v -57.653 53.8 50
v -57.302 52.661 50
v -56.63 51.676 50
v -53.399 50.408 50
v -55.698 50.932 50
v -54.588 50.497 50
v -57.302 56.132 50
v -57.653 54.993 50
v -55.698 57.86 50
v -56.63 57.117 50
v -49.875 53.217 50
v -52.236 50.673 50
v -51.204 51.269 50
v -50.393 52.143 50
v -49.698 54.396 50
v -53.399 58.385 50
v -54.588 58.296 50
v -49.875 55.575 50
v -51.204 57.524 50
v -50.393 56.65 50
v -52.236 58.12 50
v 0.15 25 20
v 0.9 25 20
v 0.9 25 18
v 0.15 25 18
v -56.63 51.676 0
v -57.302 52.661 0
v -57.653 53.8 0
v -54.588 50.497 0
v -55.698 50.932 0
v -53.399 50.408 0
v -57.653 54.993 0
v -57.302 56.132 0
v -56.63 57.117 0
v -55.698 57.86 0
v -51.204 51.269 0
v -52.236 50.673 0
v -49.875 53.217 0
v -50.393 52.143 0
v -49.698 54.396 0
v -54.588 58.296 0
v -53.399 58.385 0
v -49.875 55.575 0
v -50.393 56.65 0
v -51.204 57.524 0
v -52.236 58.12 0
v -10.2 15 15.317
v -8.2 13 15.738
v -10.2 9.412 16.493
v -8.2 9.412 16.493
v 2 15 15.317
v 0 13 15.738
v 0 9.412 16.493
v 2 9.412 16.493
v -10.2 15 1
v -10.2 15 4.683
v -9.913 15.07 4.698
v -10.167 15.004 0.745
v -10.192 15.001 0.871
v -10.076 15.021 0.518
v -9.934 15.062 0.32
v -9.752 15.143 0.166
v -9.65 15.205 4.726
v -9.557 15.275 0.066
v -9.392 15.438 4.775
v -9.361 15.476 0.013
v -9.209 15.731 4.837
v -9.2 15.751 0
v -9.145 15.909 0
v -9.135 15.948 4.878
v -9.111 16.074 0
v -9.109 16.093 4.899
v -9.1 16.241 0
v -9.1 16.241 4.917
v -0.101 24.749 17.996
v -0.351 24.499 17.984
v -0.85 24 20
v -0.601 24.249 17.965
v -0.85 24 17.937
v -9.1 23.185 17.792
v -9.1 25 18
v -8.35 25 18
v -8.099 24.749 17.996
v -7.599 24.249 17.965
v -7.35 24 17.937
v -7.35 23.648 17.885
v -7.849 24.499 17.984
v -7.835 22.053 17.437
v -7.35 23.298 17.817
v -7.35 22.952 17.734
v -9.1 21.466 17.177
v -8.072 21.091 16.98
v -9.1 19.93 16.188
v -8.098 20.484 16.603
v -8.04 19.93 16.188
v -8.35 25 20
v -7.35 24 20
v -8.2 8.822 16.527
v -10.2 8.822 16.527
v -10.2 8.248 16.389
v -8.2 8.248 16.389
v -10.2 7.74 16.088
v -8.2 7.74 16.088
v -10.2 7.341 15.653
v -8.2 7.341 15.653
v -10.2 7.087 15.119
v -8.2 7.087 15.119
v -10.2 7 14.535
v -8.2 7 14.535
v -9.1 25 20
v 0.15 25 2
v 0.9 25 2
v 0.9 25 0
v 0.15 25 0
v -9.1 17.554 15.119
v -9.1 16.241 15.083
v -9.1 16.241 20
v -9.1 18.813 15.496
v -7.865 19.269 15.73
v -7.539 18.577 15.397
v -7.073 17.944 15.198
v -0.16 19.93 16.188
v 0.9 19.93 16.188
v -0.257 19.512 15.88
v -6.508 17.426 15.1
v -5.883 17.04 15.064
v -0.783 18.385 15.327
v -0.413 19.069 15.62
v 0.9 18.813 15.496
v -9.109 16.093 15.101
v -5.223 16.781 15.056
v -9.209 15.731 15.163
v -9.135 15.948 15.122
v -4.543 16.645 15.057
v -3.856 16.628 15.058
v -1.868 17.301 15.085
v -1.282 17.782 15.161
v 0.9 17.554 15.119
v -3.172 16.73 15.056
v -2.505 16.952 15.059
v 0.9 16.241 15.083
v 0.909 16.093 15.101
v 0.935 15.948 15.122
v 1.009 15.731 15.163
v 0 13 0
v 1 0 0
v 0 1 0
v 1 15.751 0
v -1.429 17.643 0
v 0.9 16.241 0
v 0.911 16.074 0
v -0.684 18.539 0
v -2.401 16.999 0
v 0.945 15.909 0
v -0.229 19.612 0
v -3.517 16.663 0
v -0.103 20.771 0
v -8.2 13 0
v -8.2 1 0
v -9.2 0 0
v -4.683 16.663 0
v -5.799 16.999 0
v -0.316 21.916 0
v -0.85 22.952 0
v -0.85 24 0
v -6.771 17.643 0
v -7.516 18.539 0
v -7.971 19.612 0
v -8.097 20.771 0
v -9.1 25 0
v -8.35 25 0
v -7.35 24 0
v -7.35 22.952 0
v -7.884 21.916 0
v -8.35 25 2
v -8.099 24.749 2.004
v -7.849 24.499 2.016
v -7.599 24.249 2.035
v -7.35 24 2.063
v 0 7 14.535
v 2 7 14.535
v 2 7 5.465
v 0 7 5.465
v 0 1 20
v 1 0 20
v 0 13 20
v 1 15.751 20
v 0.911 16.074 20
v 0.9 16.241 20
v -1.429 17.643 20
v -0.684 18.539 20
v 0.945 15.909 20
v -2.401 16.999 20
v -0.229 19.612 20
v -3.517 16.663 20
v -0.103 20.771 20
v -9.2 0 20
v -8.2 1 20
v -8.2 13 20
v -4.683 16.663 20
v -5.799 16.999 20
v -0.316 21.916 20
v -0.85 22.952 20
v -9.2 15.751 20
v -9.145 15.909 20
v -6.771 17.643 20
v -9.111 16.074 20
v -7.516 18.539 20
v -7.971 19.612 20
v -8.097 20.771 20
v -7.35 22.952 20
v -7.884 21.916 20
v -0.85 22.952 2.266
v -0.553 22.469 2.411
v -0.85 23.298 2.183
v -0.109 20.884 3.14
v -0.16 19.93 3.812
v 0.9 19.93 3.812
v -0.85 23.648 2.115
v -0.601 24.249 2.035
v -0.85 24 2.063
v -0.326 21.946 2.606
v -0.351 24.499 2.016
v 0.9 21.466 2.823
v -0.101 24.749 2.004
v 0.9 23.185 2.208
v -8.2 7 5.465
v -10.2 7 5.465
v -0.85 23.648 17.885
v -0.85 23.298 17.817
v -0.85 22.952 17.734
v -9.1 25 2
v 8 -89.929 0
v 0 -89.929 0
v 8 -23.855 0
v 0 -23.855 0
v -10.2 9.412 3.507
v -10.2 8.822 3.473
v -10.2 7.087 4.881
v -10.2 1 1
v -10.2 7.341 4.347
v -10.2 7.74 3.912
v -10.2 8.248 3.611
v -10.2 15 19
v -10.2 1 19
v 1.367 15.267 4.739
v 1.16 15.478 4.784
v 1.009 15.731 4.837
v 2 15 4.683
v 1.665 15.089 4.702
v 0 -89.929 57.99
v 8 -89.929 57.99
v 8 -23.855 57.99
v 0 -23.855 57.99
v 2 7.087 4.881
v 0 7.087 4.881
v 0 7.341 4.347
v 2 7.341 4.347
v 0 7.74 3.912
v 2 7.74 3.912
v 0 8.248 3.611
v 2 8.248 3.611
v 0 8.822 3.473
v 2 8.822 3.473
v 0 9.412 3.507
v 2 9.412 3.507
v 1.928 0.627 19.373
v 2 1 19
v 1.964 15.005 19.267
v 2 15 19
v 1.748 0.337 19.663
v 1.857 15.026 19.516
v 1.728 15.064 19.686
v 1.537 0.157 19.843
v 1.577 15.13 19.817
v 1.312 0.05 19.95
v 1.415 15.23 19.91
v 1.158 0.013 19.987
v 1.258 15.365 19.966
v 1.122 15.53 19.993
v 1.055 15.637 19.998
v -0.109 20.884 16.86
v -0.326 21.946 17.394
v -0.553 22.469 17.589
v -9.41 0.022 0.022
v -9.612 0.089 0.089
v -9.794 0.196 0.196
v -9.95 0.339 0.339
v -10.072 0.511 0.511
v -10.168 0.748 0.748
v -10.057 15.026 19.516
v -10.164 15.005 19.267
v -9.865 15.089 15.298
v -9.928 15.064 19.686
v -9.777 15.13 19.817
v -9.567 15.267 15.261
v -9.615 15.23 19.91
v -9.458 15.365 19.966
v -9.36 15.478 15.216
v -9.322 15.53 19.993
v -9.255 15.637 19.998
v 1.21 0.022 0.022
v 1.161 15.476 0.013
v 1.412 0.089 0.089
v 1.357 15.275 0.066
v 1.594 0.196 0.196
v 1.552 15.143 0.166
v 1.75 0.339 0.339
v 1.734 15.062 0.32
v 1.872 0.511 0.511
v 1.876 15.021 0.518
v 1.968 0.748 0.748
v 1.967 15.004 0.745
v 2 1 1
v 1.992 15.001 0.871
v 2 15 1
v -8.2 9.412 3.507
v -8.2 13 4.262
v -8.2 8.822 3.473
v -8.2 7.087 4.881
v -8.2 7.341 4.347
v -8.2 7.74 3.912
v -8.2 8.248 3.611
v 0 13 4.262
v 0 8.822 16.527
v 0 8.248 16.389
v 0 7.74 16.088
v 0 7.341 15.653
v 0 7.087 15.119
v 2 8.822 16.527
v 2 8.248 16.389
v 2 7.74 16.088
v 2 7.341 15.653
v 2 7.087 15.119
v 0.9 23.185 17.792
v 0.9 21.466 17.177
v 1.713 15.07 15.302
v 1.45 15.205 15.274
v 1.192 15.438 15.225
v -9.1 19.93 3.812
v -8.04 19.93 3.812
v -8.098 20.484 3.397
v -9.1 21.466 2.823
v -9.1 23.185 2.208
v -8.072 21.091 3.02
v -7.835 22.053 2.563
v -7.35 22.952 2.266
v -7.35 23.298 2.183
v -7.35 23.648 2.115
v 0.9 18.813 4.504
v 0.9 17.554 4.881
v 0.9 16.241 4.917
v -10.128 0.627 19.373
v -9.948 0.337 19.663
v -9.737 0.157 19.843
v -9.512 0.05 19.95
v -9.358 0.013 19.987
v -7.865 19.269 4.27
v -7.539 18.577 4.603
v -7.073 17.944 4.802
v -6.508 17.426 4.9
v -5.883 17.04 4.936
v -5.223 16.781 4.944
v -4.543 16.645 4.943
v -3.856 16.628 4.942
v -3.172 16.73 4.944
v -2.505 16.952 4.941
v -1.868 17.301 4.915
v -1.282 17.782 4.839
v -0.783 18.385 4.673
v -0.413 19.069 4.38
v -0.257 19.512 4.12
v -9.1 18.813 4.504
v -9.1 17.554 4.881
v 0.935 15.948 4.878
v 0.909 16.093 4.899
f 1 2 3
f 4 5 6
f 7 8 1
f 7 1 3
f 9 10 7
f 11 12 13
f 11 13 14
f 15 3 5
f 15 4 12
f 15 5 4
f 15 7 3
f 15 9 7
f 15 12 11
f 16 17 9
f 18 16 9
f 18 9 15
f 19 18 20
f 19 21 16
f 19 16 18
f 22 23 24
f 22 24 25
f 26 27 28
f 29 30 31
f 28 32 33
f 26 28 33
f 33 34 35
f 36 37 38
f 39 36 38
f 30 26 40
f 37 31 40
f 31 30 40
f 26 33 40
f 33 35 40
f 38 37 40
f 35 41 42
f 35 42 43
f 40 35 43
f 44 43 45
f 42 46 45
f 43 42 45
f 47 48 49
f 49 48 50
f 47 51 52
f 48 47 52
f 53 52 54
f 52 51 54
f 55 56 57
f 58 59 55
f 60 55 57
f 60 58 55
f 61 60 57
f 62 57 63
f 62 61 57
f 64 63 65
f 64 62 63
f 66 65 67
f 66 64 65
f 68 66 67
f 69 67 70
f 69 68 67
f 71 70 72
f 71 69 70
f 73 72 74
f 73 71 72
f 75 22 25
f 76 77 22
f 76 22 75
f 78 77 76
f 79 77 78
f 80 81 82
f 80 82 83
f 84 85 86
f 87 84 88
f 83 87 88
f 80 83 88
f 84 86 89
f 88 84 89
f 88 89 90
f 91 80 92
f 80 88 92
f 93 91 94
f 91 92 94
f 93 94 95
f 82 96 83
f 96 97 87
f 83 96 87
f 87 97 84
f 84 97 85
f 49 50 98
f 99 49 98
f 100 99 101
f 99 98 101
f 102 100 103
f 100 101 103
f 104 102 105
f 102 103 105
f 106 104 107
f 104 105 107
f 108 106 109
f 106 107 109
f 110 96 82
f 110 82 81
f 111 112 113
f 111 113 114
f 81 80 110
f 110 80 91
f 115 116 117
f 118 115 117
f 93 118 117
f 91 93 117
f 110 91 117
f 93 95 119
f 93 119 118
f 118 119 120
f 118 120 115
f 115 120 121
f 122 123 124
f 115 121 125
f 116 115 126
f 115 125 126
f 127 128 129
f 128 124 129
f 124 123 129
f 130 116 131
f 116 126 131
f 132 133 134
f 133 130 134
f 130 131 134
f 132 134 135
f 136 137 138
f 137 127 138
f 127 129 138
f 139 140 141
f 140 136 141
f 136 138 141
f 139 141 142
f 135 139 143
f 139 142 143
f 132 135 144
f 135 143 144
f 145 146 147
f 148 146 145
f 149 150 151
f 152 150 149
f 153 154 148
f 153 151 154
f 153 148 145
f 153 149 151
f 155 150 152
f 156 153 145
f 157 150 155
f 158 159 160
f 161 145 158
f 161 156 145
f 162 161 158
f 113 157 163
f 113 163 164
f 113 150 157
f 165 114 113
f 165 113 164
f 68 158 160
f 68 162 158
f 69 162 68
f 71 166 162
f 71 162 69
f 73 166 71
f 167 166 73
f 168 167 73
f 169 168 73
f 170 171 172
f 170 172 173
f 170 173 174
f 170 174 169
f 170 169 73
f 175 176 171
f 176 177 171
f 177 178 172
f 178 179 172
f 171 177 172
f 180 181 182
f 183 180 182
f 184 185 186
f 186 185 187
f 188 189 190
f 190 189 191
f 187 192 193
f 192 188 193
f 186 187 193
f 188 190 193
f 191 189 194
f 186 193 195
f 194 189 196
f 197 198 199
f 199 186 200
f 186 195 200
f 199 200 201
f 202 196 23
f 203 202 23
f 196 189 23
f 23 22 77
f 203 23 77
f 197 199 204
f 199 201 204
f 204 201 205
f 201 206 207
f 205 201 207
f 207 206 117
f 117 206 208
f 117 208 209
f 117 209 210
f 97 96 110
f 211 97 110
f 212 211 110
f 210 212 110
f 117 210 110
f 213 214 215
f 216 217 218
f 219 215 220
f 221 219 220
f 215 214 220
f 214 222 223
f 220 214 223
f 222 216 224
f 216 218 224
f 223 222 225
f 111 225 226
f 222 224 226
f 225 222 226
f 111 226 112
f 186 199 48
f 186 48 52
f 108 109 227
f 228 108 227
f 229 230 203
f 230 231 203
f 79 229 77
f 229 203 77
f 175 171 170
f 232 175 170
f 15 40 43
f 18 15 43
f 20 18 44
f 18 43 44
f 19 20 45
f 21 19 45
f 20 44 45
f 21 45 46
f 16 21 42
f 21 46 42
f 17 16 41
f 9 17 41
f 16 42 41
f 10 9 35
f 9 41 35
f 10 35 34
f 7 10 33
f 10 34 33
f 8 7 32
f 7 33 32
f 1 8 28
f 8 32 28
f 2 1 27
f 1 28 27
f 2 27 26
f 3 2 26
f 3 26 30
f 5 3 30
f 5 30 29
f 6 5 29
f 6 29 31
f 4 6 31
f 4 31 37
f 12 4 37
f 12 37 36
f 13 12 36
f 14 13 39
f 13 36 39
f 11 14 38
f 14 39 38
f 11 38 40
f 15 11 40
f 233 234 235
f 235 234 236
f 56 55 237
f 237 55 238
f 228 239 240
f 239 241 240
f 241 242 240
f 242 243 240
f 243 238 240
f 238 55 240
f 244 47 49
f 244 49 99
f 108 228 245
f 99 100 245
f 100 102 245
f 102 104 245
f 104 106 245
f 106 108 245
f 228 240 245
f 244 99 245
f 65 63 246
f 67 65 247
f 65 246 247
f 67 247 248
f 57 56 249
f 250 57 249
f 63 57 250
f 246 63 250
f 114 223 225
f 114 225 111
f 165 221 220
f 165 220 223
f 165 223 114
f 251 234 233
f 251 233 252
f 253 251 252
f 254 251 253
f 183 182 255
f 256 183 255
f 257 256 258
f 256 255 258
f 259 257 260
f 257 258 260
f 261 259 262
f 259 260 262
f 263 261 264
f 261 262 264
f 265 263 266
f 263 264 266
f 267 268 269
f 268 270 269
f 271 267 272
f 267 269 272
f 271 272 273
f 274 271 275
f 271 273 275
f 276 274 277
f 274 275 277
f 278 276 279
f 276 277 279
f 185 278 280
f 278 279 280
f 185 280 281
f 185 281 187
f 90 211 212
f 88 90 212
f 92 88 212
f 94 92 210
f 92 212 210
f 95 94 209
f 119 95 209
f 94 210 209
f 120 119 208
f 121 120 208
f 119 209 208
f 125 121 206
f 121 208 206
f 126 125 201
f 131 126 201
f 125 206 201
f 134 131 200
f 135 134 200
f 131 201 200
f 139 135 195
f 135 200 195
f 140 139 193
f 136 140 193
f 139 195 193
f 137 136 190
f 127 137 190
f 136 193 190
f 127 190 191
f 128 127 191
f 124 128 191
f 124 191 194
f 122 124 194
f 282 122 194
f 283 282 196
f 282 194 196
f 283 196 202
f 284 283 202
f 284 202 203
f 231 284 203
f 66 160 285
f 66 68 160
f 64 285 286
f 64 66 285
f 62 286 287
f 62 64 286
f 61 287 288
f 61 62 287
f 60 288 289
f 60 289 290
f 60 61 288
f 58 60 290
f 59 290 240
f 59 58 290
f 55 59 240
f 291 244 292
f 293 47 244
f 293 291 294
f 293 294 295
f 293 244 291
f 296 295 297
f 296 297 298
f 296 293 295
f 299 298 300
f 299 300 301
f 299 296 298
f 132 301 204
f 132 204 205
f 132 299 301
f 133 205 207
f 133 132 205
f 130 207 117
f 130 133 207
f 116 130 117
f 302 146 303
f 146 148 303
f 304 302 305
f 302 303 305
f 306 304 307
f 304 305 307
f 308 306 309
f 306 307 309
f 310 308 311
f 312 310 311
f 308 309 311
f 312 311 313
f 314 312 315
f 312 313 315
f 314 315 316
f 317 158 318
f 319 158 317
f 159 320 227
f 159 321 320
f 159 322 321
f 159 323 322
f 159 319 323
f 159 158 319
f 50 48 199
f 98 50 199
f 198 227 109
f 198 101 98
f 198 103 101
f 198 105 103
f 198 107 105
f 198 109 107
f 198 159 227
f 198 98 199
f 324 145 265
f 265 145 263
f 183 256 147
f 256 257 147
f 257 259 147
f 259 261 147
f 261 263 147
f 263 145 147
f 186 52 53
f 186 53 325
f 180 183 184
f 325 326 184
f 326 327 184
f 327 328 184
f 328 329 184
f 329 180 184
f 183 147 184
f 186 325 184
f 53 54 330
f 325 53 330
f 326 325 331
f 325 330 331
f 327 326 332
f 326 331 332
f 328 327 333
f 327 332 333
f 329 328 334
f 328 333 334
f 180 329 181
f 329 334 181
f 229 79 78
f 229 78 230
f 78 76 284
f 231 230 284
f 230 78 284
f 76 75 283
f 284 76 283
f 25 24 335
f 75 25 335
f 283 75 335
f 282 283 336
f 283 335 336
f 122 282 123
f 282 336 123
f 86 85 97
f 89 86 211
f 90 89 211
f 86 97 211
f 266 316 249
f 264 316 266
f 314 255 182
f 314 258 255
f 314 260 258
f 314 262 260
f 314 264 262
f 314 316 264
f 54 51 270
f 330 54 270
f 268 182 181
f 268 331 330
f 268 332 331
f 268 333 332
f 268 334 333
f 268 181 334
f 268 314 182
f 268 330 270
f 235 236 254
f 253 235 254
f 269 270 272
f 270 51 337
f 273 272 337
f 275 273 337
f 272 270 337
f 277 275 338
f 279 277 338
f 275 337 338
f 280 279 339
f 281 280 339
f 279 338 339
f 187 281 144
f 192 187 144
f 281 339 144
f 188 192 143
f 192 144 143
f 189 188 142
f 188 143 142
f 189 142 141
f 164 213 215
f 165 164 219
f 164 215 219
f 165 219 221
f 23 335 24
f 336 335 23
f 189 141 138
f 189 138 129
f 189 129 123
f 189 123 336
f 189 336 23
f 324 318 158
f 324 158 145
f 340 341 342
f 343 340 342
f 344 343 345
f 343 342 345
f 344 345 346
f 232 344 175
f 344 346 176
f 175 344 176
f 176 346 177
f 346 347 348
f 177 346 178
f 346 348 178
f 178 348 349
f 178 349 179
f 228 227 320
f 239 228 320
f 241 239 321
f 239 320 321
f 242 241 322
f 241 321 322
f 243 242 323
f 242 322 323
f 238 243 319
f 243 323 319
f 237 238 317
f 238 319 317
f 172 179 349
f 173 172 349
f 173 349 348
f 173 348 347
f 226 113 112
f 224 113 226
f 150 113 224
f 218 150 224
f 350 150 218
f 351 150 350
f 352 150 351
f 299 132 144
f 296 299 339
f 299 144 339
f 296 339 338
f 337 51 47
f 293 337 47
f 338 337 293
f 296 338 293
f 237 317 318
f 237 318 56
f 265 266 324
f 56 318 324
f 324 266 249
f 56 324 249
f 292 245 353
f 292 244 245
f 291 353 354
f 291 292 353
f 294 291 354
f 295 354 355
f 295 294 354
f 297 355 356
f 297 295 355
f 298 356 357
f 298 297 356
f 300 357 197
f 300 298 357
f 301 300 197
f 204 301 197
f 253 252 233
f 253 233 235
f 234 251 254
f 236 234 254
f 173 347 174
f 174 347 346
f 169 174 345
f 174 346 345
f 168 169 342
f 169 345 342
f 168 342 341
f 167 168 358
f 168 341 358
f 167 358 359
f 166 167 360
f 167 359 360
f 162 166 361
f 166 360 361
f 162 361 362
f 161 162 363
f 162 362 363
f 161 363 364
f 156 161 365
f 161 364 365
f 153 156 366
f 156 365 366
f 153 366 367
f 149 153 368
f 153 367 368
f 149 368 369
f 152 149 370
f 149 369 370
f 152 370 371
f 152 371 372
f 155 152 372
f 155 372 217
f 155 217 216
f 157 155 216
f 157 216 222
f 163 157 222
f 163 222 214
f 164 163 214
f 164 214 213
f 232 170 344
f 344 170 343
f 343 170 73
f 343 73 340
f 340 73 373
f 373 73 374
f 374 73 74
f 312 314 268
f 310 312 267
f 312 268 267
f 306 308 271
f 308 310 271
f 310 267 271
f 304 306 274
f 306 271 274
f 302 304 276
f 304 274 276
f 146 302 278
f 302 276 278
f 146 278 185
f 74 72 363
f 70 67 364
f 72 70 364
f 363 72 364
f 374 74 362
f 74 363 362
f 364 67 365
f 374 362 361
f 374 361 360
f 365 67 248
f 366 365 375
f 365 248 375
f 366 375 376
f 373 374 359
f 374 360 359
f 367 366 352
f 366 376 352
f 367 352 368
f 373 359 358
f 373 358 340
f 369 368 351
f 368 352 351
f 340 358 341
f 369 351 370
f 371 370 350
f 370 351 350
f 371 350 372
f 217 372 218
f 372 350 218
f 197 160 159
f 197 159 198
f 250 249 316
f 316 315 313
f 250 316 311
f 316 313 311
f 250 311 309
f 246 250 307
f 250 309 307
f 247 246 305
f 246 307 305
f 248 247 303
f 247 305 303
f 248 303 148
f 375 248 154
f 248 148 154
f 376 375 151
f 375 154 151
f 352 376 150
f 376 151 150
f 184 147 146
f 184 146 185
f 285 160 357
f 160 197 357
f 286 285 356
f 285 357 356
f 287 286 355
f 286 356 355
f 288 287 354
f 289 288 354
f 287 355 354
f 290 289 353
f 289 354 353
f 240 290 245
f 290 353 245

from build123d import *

# Parameters (mm, degrees)
F0_W        = 2
F0_H        = 20
F0_W_2      = 8.2
F1_DEPTH    = 15
F2_DEPTH    = 13
F3_W        = 10
F3_H        = 20
F4_DEPTH    = 10
F5_T1_DEPTH = 20
F7_DEPTH    = 20.001
F8_SIZE     = 1
F9_R        = 1
F10_SIZE    = 0.99999
F11_R       = 4
F12_DEPTH   = 50
F13_W       = 66.0741459578
F13_H       = 57.9895451665
F14_DEPTH   = 8
F16_DEPTH   = 25


# Not quite as in the source:
# - a fillet or chamfer that OpenCascade refuses, or shapes differently, is made with other operations: its cross-section is extruded or revolved along the edge and cut away or added
# - a fillet or chamfer is up to 0.001 mm smaller than in the source, because OpenCascade refuses the exact size
# - a feature names something its author has since deleted; it is built from what else it names


with BuildPart() as f1:
    # F0 (on Front) → F1 (new body)
    with BuildSketch(Plane.XZ):
        with Locations((1, 10)):
            Rectangle(F0_W, F0_H)
        with Locations((-9.2, 10)):
            Rectangle(F0_W, F0_H)
        with Locations((-4.1, 10)):
            Rectangle(F0_W_2, F0_H)
    extrude(amount=-F1_DEPTH)

    # F0 (on Front) → F2 (cut)
    with BuildSketch(Plane.XZ):
        with Locations((-4.1, 10)):
            Rectangle(F0_W_2, F0_H)
    extrude(amount=-F2_DEPTH, mode=Mode.SUBTRACT)

    # F3 (on face) → F4 (join)
    with BuildSketch(Plane(origin=(0, 15, 0), x_dir=(-1, 0, 0), z_dir=(0, 1, 0))):
        with Locations((4.1, 10)):
            Rectangle(F3_W, F3_H)
    extrude(amount=F4_DEPTH)

    # F5: fillet of radius 1.25 on 2 edges, made by hand

    # F5_s2 → F5_t1 (join)
    with BuildSketch(Plane.XY):
        with BuildLine():
            ThreePointArc((-10.2, 15), (-9.4145856533, 15.411811167), (-9.1, 16.2409673646))
            Line((-9.1, 16.2409673646), (-9.075, 16.2409673646))
            Line((-9.075, 16.2409673646), (-9.075, 15))
            Line((-9.075, 15), (-9.1, 14.975))
            ThreePointArc((-9.1, 14.975), (-9.65, 14.975), (-10.197, 14.9751806527))
            Line((-10.197, 14.9751806527), (-10.2, 15))
        make_face()
        with BuildLine():
            ThreePointArc((2, 15), (1.2145856533, 15.411811167), (0.9, 16.2409673646))
            Line((0.9, 16.2409673646), (0.875, 16.2409673646))
            Line((0.875, 16.2409673646), (0.875, 15))
            Line((0.875, 15), (0.9, 14.975))
            ThreePointArc((0.9, 14.975), (1.45, 14.975), (1.997, 14.9751806527))
            Line((1.997, 14.9751806527), (2, 15))
        make_face()
    extrude(amount=F5_T1_DEPTH)

    # F6 (on face) → F7 (cut, through all)
    with BuildSketch(Plane.XY.offset(20)):
        with BuildLine():
            Line((-7.35, 25), (-7.35, 22.9523284456))
            ThreePointArc((-7.35, 22.9523284456), (-4.1, 16.6204836823), (-0.85, 22.9523284456))
            Line((-0.85, 22.9523284456), (-0.85, 25))
            Line((-0.85, 25), (-7.35, 25))
        make_face()
    extrude(amount=-F7_DEPTH, mode=Mode.SUBTRACT)

    # F8
    f8_edges = [f1.edges().sort_by_distance(p)[0] for p in [
        (-0.85, 25, 10),
        (-7.35, 25, 10),
    ]]
    chamfer(f8_edges, length=F8_SIZE)

    # F9
    f9_edges = [f1.edges().sort_by_distance(p)[0] for p in [
        (-10.2, 7.5, 20),
        (-10.2, 7.5, 0),
        (-10.2, 0, 10),
        (2, 7.5, 20),
        (2, 7.5, 0),
        (2, 0, 10),
    ]]
    fillet(f9_edges, radius=F9_R)

    # F10 (size 1 in the source; OpenCascade refuses exactly that, so slightly less here)
    f10_edges = [f1.edges().sort_by_distance(p)[0] for p in [
        (0, 0, 10),
        (-8.2, 0, 10),
    ]]
    chamfer(f10_edges, length=F10_SIZE)

    # F15 (on face) → F16 (cut)
    with BuildSketch(Plane.YZ.offset(2)):
        with BuildLine():
            Line((15, 15.3167871196), (9.4117872498, 16.4925560795))
            ThreePointArc((9.4117872498, 16.4925560795), (7.7397568686, 16.0884003189), (7, 14.5354073216))
            Line((7, 14.5354073216), (7, 5.4645926784))
            ThreePointArc((7, 5.4645926784), (7.7397568686, 3.9115996811), (9.4117872498, 3.5074439205))
            Line((9.4117872498, 3.5074439205), (15, 4.6832128804))
            Line((15, 4.6832128804), (15, 15.3167871196))
        make_face()
        with BuildLine():
            Line((15.7314883663, 15.1628807896), (15, 15.3167871196))
            Line((15, 15.3167871196), (15, 4.6832128804))
            Line((15, 4.6832128804), (15.7314883663, 4.8371192104))
            ThreePointArc((15.7314883663, 4.8371192104), (17.9471476835, 4.8015048188), (19.9298193789, 3.8118445018))
            ThreePointArc((19.9298193789, 3.8118445018), (33, 10), (19.9298193789, 16.1881554982))
            ThreePointArc((19.9298193789, 16.1881554982), (17.9471476835, 15.1984951812), (15.7314883663, 15.1628807896))
        make_face()
    extrude(amount=-F16_DEPTH, mode=Mode.SUBTRACT)


with BuildPart() as f12:
    # F11 (on Top) → F12 (new body)
    with BuildSketch(Plane.XY):
        with Locations((-53.69772017, 54.3963909149)):
            Circle(F11_R)
    extrude(amount=F12_DEPTH)


with BuildPart() as f14:
    # F13 (on Right) → F14 (new body)
    with BuildSketch(Plane.YZ):
        with Locations((-56.8916359916, 28.9947725832)):
            Rectangle(F13_W, F13_H)
    extrude(amount=F14_DEPTH)


solid = Compound([f1.part, f12.part, f14.part])
